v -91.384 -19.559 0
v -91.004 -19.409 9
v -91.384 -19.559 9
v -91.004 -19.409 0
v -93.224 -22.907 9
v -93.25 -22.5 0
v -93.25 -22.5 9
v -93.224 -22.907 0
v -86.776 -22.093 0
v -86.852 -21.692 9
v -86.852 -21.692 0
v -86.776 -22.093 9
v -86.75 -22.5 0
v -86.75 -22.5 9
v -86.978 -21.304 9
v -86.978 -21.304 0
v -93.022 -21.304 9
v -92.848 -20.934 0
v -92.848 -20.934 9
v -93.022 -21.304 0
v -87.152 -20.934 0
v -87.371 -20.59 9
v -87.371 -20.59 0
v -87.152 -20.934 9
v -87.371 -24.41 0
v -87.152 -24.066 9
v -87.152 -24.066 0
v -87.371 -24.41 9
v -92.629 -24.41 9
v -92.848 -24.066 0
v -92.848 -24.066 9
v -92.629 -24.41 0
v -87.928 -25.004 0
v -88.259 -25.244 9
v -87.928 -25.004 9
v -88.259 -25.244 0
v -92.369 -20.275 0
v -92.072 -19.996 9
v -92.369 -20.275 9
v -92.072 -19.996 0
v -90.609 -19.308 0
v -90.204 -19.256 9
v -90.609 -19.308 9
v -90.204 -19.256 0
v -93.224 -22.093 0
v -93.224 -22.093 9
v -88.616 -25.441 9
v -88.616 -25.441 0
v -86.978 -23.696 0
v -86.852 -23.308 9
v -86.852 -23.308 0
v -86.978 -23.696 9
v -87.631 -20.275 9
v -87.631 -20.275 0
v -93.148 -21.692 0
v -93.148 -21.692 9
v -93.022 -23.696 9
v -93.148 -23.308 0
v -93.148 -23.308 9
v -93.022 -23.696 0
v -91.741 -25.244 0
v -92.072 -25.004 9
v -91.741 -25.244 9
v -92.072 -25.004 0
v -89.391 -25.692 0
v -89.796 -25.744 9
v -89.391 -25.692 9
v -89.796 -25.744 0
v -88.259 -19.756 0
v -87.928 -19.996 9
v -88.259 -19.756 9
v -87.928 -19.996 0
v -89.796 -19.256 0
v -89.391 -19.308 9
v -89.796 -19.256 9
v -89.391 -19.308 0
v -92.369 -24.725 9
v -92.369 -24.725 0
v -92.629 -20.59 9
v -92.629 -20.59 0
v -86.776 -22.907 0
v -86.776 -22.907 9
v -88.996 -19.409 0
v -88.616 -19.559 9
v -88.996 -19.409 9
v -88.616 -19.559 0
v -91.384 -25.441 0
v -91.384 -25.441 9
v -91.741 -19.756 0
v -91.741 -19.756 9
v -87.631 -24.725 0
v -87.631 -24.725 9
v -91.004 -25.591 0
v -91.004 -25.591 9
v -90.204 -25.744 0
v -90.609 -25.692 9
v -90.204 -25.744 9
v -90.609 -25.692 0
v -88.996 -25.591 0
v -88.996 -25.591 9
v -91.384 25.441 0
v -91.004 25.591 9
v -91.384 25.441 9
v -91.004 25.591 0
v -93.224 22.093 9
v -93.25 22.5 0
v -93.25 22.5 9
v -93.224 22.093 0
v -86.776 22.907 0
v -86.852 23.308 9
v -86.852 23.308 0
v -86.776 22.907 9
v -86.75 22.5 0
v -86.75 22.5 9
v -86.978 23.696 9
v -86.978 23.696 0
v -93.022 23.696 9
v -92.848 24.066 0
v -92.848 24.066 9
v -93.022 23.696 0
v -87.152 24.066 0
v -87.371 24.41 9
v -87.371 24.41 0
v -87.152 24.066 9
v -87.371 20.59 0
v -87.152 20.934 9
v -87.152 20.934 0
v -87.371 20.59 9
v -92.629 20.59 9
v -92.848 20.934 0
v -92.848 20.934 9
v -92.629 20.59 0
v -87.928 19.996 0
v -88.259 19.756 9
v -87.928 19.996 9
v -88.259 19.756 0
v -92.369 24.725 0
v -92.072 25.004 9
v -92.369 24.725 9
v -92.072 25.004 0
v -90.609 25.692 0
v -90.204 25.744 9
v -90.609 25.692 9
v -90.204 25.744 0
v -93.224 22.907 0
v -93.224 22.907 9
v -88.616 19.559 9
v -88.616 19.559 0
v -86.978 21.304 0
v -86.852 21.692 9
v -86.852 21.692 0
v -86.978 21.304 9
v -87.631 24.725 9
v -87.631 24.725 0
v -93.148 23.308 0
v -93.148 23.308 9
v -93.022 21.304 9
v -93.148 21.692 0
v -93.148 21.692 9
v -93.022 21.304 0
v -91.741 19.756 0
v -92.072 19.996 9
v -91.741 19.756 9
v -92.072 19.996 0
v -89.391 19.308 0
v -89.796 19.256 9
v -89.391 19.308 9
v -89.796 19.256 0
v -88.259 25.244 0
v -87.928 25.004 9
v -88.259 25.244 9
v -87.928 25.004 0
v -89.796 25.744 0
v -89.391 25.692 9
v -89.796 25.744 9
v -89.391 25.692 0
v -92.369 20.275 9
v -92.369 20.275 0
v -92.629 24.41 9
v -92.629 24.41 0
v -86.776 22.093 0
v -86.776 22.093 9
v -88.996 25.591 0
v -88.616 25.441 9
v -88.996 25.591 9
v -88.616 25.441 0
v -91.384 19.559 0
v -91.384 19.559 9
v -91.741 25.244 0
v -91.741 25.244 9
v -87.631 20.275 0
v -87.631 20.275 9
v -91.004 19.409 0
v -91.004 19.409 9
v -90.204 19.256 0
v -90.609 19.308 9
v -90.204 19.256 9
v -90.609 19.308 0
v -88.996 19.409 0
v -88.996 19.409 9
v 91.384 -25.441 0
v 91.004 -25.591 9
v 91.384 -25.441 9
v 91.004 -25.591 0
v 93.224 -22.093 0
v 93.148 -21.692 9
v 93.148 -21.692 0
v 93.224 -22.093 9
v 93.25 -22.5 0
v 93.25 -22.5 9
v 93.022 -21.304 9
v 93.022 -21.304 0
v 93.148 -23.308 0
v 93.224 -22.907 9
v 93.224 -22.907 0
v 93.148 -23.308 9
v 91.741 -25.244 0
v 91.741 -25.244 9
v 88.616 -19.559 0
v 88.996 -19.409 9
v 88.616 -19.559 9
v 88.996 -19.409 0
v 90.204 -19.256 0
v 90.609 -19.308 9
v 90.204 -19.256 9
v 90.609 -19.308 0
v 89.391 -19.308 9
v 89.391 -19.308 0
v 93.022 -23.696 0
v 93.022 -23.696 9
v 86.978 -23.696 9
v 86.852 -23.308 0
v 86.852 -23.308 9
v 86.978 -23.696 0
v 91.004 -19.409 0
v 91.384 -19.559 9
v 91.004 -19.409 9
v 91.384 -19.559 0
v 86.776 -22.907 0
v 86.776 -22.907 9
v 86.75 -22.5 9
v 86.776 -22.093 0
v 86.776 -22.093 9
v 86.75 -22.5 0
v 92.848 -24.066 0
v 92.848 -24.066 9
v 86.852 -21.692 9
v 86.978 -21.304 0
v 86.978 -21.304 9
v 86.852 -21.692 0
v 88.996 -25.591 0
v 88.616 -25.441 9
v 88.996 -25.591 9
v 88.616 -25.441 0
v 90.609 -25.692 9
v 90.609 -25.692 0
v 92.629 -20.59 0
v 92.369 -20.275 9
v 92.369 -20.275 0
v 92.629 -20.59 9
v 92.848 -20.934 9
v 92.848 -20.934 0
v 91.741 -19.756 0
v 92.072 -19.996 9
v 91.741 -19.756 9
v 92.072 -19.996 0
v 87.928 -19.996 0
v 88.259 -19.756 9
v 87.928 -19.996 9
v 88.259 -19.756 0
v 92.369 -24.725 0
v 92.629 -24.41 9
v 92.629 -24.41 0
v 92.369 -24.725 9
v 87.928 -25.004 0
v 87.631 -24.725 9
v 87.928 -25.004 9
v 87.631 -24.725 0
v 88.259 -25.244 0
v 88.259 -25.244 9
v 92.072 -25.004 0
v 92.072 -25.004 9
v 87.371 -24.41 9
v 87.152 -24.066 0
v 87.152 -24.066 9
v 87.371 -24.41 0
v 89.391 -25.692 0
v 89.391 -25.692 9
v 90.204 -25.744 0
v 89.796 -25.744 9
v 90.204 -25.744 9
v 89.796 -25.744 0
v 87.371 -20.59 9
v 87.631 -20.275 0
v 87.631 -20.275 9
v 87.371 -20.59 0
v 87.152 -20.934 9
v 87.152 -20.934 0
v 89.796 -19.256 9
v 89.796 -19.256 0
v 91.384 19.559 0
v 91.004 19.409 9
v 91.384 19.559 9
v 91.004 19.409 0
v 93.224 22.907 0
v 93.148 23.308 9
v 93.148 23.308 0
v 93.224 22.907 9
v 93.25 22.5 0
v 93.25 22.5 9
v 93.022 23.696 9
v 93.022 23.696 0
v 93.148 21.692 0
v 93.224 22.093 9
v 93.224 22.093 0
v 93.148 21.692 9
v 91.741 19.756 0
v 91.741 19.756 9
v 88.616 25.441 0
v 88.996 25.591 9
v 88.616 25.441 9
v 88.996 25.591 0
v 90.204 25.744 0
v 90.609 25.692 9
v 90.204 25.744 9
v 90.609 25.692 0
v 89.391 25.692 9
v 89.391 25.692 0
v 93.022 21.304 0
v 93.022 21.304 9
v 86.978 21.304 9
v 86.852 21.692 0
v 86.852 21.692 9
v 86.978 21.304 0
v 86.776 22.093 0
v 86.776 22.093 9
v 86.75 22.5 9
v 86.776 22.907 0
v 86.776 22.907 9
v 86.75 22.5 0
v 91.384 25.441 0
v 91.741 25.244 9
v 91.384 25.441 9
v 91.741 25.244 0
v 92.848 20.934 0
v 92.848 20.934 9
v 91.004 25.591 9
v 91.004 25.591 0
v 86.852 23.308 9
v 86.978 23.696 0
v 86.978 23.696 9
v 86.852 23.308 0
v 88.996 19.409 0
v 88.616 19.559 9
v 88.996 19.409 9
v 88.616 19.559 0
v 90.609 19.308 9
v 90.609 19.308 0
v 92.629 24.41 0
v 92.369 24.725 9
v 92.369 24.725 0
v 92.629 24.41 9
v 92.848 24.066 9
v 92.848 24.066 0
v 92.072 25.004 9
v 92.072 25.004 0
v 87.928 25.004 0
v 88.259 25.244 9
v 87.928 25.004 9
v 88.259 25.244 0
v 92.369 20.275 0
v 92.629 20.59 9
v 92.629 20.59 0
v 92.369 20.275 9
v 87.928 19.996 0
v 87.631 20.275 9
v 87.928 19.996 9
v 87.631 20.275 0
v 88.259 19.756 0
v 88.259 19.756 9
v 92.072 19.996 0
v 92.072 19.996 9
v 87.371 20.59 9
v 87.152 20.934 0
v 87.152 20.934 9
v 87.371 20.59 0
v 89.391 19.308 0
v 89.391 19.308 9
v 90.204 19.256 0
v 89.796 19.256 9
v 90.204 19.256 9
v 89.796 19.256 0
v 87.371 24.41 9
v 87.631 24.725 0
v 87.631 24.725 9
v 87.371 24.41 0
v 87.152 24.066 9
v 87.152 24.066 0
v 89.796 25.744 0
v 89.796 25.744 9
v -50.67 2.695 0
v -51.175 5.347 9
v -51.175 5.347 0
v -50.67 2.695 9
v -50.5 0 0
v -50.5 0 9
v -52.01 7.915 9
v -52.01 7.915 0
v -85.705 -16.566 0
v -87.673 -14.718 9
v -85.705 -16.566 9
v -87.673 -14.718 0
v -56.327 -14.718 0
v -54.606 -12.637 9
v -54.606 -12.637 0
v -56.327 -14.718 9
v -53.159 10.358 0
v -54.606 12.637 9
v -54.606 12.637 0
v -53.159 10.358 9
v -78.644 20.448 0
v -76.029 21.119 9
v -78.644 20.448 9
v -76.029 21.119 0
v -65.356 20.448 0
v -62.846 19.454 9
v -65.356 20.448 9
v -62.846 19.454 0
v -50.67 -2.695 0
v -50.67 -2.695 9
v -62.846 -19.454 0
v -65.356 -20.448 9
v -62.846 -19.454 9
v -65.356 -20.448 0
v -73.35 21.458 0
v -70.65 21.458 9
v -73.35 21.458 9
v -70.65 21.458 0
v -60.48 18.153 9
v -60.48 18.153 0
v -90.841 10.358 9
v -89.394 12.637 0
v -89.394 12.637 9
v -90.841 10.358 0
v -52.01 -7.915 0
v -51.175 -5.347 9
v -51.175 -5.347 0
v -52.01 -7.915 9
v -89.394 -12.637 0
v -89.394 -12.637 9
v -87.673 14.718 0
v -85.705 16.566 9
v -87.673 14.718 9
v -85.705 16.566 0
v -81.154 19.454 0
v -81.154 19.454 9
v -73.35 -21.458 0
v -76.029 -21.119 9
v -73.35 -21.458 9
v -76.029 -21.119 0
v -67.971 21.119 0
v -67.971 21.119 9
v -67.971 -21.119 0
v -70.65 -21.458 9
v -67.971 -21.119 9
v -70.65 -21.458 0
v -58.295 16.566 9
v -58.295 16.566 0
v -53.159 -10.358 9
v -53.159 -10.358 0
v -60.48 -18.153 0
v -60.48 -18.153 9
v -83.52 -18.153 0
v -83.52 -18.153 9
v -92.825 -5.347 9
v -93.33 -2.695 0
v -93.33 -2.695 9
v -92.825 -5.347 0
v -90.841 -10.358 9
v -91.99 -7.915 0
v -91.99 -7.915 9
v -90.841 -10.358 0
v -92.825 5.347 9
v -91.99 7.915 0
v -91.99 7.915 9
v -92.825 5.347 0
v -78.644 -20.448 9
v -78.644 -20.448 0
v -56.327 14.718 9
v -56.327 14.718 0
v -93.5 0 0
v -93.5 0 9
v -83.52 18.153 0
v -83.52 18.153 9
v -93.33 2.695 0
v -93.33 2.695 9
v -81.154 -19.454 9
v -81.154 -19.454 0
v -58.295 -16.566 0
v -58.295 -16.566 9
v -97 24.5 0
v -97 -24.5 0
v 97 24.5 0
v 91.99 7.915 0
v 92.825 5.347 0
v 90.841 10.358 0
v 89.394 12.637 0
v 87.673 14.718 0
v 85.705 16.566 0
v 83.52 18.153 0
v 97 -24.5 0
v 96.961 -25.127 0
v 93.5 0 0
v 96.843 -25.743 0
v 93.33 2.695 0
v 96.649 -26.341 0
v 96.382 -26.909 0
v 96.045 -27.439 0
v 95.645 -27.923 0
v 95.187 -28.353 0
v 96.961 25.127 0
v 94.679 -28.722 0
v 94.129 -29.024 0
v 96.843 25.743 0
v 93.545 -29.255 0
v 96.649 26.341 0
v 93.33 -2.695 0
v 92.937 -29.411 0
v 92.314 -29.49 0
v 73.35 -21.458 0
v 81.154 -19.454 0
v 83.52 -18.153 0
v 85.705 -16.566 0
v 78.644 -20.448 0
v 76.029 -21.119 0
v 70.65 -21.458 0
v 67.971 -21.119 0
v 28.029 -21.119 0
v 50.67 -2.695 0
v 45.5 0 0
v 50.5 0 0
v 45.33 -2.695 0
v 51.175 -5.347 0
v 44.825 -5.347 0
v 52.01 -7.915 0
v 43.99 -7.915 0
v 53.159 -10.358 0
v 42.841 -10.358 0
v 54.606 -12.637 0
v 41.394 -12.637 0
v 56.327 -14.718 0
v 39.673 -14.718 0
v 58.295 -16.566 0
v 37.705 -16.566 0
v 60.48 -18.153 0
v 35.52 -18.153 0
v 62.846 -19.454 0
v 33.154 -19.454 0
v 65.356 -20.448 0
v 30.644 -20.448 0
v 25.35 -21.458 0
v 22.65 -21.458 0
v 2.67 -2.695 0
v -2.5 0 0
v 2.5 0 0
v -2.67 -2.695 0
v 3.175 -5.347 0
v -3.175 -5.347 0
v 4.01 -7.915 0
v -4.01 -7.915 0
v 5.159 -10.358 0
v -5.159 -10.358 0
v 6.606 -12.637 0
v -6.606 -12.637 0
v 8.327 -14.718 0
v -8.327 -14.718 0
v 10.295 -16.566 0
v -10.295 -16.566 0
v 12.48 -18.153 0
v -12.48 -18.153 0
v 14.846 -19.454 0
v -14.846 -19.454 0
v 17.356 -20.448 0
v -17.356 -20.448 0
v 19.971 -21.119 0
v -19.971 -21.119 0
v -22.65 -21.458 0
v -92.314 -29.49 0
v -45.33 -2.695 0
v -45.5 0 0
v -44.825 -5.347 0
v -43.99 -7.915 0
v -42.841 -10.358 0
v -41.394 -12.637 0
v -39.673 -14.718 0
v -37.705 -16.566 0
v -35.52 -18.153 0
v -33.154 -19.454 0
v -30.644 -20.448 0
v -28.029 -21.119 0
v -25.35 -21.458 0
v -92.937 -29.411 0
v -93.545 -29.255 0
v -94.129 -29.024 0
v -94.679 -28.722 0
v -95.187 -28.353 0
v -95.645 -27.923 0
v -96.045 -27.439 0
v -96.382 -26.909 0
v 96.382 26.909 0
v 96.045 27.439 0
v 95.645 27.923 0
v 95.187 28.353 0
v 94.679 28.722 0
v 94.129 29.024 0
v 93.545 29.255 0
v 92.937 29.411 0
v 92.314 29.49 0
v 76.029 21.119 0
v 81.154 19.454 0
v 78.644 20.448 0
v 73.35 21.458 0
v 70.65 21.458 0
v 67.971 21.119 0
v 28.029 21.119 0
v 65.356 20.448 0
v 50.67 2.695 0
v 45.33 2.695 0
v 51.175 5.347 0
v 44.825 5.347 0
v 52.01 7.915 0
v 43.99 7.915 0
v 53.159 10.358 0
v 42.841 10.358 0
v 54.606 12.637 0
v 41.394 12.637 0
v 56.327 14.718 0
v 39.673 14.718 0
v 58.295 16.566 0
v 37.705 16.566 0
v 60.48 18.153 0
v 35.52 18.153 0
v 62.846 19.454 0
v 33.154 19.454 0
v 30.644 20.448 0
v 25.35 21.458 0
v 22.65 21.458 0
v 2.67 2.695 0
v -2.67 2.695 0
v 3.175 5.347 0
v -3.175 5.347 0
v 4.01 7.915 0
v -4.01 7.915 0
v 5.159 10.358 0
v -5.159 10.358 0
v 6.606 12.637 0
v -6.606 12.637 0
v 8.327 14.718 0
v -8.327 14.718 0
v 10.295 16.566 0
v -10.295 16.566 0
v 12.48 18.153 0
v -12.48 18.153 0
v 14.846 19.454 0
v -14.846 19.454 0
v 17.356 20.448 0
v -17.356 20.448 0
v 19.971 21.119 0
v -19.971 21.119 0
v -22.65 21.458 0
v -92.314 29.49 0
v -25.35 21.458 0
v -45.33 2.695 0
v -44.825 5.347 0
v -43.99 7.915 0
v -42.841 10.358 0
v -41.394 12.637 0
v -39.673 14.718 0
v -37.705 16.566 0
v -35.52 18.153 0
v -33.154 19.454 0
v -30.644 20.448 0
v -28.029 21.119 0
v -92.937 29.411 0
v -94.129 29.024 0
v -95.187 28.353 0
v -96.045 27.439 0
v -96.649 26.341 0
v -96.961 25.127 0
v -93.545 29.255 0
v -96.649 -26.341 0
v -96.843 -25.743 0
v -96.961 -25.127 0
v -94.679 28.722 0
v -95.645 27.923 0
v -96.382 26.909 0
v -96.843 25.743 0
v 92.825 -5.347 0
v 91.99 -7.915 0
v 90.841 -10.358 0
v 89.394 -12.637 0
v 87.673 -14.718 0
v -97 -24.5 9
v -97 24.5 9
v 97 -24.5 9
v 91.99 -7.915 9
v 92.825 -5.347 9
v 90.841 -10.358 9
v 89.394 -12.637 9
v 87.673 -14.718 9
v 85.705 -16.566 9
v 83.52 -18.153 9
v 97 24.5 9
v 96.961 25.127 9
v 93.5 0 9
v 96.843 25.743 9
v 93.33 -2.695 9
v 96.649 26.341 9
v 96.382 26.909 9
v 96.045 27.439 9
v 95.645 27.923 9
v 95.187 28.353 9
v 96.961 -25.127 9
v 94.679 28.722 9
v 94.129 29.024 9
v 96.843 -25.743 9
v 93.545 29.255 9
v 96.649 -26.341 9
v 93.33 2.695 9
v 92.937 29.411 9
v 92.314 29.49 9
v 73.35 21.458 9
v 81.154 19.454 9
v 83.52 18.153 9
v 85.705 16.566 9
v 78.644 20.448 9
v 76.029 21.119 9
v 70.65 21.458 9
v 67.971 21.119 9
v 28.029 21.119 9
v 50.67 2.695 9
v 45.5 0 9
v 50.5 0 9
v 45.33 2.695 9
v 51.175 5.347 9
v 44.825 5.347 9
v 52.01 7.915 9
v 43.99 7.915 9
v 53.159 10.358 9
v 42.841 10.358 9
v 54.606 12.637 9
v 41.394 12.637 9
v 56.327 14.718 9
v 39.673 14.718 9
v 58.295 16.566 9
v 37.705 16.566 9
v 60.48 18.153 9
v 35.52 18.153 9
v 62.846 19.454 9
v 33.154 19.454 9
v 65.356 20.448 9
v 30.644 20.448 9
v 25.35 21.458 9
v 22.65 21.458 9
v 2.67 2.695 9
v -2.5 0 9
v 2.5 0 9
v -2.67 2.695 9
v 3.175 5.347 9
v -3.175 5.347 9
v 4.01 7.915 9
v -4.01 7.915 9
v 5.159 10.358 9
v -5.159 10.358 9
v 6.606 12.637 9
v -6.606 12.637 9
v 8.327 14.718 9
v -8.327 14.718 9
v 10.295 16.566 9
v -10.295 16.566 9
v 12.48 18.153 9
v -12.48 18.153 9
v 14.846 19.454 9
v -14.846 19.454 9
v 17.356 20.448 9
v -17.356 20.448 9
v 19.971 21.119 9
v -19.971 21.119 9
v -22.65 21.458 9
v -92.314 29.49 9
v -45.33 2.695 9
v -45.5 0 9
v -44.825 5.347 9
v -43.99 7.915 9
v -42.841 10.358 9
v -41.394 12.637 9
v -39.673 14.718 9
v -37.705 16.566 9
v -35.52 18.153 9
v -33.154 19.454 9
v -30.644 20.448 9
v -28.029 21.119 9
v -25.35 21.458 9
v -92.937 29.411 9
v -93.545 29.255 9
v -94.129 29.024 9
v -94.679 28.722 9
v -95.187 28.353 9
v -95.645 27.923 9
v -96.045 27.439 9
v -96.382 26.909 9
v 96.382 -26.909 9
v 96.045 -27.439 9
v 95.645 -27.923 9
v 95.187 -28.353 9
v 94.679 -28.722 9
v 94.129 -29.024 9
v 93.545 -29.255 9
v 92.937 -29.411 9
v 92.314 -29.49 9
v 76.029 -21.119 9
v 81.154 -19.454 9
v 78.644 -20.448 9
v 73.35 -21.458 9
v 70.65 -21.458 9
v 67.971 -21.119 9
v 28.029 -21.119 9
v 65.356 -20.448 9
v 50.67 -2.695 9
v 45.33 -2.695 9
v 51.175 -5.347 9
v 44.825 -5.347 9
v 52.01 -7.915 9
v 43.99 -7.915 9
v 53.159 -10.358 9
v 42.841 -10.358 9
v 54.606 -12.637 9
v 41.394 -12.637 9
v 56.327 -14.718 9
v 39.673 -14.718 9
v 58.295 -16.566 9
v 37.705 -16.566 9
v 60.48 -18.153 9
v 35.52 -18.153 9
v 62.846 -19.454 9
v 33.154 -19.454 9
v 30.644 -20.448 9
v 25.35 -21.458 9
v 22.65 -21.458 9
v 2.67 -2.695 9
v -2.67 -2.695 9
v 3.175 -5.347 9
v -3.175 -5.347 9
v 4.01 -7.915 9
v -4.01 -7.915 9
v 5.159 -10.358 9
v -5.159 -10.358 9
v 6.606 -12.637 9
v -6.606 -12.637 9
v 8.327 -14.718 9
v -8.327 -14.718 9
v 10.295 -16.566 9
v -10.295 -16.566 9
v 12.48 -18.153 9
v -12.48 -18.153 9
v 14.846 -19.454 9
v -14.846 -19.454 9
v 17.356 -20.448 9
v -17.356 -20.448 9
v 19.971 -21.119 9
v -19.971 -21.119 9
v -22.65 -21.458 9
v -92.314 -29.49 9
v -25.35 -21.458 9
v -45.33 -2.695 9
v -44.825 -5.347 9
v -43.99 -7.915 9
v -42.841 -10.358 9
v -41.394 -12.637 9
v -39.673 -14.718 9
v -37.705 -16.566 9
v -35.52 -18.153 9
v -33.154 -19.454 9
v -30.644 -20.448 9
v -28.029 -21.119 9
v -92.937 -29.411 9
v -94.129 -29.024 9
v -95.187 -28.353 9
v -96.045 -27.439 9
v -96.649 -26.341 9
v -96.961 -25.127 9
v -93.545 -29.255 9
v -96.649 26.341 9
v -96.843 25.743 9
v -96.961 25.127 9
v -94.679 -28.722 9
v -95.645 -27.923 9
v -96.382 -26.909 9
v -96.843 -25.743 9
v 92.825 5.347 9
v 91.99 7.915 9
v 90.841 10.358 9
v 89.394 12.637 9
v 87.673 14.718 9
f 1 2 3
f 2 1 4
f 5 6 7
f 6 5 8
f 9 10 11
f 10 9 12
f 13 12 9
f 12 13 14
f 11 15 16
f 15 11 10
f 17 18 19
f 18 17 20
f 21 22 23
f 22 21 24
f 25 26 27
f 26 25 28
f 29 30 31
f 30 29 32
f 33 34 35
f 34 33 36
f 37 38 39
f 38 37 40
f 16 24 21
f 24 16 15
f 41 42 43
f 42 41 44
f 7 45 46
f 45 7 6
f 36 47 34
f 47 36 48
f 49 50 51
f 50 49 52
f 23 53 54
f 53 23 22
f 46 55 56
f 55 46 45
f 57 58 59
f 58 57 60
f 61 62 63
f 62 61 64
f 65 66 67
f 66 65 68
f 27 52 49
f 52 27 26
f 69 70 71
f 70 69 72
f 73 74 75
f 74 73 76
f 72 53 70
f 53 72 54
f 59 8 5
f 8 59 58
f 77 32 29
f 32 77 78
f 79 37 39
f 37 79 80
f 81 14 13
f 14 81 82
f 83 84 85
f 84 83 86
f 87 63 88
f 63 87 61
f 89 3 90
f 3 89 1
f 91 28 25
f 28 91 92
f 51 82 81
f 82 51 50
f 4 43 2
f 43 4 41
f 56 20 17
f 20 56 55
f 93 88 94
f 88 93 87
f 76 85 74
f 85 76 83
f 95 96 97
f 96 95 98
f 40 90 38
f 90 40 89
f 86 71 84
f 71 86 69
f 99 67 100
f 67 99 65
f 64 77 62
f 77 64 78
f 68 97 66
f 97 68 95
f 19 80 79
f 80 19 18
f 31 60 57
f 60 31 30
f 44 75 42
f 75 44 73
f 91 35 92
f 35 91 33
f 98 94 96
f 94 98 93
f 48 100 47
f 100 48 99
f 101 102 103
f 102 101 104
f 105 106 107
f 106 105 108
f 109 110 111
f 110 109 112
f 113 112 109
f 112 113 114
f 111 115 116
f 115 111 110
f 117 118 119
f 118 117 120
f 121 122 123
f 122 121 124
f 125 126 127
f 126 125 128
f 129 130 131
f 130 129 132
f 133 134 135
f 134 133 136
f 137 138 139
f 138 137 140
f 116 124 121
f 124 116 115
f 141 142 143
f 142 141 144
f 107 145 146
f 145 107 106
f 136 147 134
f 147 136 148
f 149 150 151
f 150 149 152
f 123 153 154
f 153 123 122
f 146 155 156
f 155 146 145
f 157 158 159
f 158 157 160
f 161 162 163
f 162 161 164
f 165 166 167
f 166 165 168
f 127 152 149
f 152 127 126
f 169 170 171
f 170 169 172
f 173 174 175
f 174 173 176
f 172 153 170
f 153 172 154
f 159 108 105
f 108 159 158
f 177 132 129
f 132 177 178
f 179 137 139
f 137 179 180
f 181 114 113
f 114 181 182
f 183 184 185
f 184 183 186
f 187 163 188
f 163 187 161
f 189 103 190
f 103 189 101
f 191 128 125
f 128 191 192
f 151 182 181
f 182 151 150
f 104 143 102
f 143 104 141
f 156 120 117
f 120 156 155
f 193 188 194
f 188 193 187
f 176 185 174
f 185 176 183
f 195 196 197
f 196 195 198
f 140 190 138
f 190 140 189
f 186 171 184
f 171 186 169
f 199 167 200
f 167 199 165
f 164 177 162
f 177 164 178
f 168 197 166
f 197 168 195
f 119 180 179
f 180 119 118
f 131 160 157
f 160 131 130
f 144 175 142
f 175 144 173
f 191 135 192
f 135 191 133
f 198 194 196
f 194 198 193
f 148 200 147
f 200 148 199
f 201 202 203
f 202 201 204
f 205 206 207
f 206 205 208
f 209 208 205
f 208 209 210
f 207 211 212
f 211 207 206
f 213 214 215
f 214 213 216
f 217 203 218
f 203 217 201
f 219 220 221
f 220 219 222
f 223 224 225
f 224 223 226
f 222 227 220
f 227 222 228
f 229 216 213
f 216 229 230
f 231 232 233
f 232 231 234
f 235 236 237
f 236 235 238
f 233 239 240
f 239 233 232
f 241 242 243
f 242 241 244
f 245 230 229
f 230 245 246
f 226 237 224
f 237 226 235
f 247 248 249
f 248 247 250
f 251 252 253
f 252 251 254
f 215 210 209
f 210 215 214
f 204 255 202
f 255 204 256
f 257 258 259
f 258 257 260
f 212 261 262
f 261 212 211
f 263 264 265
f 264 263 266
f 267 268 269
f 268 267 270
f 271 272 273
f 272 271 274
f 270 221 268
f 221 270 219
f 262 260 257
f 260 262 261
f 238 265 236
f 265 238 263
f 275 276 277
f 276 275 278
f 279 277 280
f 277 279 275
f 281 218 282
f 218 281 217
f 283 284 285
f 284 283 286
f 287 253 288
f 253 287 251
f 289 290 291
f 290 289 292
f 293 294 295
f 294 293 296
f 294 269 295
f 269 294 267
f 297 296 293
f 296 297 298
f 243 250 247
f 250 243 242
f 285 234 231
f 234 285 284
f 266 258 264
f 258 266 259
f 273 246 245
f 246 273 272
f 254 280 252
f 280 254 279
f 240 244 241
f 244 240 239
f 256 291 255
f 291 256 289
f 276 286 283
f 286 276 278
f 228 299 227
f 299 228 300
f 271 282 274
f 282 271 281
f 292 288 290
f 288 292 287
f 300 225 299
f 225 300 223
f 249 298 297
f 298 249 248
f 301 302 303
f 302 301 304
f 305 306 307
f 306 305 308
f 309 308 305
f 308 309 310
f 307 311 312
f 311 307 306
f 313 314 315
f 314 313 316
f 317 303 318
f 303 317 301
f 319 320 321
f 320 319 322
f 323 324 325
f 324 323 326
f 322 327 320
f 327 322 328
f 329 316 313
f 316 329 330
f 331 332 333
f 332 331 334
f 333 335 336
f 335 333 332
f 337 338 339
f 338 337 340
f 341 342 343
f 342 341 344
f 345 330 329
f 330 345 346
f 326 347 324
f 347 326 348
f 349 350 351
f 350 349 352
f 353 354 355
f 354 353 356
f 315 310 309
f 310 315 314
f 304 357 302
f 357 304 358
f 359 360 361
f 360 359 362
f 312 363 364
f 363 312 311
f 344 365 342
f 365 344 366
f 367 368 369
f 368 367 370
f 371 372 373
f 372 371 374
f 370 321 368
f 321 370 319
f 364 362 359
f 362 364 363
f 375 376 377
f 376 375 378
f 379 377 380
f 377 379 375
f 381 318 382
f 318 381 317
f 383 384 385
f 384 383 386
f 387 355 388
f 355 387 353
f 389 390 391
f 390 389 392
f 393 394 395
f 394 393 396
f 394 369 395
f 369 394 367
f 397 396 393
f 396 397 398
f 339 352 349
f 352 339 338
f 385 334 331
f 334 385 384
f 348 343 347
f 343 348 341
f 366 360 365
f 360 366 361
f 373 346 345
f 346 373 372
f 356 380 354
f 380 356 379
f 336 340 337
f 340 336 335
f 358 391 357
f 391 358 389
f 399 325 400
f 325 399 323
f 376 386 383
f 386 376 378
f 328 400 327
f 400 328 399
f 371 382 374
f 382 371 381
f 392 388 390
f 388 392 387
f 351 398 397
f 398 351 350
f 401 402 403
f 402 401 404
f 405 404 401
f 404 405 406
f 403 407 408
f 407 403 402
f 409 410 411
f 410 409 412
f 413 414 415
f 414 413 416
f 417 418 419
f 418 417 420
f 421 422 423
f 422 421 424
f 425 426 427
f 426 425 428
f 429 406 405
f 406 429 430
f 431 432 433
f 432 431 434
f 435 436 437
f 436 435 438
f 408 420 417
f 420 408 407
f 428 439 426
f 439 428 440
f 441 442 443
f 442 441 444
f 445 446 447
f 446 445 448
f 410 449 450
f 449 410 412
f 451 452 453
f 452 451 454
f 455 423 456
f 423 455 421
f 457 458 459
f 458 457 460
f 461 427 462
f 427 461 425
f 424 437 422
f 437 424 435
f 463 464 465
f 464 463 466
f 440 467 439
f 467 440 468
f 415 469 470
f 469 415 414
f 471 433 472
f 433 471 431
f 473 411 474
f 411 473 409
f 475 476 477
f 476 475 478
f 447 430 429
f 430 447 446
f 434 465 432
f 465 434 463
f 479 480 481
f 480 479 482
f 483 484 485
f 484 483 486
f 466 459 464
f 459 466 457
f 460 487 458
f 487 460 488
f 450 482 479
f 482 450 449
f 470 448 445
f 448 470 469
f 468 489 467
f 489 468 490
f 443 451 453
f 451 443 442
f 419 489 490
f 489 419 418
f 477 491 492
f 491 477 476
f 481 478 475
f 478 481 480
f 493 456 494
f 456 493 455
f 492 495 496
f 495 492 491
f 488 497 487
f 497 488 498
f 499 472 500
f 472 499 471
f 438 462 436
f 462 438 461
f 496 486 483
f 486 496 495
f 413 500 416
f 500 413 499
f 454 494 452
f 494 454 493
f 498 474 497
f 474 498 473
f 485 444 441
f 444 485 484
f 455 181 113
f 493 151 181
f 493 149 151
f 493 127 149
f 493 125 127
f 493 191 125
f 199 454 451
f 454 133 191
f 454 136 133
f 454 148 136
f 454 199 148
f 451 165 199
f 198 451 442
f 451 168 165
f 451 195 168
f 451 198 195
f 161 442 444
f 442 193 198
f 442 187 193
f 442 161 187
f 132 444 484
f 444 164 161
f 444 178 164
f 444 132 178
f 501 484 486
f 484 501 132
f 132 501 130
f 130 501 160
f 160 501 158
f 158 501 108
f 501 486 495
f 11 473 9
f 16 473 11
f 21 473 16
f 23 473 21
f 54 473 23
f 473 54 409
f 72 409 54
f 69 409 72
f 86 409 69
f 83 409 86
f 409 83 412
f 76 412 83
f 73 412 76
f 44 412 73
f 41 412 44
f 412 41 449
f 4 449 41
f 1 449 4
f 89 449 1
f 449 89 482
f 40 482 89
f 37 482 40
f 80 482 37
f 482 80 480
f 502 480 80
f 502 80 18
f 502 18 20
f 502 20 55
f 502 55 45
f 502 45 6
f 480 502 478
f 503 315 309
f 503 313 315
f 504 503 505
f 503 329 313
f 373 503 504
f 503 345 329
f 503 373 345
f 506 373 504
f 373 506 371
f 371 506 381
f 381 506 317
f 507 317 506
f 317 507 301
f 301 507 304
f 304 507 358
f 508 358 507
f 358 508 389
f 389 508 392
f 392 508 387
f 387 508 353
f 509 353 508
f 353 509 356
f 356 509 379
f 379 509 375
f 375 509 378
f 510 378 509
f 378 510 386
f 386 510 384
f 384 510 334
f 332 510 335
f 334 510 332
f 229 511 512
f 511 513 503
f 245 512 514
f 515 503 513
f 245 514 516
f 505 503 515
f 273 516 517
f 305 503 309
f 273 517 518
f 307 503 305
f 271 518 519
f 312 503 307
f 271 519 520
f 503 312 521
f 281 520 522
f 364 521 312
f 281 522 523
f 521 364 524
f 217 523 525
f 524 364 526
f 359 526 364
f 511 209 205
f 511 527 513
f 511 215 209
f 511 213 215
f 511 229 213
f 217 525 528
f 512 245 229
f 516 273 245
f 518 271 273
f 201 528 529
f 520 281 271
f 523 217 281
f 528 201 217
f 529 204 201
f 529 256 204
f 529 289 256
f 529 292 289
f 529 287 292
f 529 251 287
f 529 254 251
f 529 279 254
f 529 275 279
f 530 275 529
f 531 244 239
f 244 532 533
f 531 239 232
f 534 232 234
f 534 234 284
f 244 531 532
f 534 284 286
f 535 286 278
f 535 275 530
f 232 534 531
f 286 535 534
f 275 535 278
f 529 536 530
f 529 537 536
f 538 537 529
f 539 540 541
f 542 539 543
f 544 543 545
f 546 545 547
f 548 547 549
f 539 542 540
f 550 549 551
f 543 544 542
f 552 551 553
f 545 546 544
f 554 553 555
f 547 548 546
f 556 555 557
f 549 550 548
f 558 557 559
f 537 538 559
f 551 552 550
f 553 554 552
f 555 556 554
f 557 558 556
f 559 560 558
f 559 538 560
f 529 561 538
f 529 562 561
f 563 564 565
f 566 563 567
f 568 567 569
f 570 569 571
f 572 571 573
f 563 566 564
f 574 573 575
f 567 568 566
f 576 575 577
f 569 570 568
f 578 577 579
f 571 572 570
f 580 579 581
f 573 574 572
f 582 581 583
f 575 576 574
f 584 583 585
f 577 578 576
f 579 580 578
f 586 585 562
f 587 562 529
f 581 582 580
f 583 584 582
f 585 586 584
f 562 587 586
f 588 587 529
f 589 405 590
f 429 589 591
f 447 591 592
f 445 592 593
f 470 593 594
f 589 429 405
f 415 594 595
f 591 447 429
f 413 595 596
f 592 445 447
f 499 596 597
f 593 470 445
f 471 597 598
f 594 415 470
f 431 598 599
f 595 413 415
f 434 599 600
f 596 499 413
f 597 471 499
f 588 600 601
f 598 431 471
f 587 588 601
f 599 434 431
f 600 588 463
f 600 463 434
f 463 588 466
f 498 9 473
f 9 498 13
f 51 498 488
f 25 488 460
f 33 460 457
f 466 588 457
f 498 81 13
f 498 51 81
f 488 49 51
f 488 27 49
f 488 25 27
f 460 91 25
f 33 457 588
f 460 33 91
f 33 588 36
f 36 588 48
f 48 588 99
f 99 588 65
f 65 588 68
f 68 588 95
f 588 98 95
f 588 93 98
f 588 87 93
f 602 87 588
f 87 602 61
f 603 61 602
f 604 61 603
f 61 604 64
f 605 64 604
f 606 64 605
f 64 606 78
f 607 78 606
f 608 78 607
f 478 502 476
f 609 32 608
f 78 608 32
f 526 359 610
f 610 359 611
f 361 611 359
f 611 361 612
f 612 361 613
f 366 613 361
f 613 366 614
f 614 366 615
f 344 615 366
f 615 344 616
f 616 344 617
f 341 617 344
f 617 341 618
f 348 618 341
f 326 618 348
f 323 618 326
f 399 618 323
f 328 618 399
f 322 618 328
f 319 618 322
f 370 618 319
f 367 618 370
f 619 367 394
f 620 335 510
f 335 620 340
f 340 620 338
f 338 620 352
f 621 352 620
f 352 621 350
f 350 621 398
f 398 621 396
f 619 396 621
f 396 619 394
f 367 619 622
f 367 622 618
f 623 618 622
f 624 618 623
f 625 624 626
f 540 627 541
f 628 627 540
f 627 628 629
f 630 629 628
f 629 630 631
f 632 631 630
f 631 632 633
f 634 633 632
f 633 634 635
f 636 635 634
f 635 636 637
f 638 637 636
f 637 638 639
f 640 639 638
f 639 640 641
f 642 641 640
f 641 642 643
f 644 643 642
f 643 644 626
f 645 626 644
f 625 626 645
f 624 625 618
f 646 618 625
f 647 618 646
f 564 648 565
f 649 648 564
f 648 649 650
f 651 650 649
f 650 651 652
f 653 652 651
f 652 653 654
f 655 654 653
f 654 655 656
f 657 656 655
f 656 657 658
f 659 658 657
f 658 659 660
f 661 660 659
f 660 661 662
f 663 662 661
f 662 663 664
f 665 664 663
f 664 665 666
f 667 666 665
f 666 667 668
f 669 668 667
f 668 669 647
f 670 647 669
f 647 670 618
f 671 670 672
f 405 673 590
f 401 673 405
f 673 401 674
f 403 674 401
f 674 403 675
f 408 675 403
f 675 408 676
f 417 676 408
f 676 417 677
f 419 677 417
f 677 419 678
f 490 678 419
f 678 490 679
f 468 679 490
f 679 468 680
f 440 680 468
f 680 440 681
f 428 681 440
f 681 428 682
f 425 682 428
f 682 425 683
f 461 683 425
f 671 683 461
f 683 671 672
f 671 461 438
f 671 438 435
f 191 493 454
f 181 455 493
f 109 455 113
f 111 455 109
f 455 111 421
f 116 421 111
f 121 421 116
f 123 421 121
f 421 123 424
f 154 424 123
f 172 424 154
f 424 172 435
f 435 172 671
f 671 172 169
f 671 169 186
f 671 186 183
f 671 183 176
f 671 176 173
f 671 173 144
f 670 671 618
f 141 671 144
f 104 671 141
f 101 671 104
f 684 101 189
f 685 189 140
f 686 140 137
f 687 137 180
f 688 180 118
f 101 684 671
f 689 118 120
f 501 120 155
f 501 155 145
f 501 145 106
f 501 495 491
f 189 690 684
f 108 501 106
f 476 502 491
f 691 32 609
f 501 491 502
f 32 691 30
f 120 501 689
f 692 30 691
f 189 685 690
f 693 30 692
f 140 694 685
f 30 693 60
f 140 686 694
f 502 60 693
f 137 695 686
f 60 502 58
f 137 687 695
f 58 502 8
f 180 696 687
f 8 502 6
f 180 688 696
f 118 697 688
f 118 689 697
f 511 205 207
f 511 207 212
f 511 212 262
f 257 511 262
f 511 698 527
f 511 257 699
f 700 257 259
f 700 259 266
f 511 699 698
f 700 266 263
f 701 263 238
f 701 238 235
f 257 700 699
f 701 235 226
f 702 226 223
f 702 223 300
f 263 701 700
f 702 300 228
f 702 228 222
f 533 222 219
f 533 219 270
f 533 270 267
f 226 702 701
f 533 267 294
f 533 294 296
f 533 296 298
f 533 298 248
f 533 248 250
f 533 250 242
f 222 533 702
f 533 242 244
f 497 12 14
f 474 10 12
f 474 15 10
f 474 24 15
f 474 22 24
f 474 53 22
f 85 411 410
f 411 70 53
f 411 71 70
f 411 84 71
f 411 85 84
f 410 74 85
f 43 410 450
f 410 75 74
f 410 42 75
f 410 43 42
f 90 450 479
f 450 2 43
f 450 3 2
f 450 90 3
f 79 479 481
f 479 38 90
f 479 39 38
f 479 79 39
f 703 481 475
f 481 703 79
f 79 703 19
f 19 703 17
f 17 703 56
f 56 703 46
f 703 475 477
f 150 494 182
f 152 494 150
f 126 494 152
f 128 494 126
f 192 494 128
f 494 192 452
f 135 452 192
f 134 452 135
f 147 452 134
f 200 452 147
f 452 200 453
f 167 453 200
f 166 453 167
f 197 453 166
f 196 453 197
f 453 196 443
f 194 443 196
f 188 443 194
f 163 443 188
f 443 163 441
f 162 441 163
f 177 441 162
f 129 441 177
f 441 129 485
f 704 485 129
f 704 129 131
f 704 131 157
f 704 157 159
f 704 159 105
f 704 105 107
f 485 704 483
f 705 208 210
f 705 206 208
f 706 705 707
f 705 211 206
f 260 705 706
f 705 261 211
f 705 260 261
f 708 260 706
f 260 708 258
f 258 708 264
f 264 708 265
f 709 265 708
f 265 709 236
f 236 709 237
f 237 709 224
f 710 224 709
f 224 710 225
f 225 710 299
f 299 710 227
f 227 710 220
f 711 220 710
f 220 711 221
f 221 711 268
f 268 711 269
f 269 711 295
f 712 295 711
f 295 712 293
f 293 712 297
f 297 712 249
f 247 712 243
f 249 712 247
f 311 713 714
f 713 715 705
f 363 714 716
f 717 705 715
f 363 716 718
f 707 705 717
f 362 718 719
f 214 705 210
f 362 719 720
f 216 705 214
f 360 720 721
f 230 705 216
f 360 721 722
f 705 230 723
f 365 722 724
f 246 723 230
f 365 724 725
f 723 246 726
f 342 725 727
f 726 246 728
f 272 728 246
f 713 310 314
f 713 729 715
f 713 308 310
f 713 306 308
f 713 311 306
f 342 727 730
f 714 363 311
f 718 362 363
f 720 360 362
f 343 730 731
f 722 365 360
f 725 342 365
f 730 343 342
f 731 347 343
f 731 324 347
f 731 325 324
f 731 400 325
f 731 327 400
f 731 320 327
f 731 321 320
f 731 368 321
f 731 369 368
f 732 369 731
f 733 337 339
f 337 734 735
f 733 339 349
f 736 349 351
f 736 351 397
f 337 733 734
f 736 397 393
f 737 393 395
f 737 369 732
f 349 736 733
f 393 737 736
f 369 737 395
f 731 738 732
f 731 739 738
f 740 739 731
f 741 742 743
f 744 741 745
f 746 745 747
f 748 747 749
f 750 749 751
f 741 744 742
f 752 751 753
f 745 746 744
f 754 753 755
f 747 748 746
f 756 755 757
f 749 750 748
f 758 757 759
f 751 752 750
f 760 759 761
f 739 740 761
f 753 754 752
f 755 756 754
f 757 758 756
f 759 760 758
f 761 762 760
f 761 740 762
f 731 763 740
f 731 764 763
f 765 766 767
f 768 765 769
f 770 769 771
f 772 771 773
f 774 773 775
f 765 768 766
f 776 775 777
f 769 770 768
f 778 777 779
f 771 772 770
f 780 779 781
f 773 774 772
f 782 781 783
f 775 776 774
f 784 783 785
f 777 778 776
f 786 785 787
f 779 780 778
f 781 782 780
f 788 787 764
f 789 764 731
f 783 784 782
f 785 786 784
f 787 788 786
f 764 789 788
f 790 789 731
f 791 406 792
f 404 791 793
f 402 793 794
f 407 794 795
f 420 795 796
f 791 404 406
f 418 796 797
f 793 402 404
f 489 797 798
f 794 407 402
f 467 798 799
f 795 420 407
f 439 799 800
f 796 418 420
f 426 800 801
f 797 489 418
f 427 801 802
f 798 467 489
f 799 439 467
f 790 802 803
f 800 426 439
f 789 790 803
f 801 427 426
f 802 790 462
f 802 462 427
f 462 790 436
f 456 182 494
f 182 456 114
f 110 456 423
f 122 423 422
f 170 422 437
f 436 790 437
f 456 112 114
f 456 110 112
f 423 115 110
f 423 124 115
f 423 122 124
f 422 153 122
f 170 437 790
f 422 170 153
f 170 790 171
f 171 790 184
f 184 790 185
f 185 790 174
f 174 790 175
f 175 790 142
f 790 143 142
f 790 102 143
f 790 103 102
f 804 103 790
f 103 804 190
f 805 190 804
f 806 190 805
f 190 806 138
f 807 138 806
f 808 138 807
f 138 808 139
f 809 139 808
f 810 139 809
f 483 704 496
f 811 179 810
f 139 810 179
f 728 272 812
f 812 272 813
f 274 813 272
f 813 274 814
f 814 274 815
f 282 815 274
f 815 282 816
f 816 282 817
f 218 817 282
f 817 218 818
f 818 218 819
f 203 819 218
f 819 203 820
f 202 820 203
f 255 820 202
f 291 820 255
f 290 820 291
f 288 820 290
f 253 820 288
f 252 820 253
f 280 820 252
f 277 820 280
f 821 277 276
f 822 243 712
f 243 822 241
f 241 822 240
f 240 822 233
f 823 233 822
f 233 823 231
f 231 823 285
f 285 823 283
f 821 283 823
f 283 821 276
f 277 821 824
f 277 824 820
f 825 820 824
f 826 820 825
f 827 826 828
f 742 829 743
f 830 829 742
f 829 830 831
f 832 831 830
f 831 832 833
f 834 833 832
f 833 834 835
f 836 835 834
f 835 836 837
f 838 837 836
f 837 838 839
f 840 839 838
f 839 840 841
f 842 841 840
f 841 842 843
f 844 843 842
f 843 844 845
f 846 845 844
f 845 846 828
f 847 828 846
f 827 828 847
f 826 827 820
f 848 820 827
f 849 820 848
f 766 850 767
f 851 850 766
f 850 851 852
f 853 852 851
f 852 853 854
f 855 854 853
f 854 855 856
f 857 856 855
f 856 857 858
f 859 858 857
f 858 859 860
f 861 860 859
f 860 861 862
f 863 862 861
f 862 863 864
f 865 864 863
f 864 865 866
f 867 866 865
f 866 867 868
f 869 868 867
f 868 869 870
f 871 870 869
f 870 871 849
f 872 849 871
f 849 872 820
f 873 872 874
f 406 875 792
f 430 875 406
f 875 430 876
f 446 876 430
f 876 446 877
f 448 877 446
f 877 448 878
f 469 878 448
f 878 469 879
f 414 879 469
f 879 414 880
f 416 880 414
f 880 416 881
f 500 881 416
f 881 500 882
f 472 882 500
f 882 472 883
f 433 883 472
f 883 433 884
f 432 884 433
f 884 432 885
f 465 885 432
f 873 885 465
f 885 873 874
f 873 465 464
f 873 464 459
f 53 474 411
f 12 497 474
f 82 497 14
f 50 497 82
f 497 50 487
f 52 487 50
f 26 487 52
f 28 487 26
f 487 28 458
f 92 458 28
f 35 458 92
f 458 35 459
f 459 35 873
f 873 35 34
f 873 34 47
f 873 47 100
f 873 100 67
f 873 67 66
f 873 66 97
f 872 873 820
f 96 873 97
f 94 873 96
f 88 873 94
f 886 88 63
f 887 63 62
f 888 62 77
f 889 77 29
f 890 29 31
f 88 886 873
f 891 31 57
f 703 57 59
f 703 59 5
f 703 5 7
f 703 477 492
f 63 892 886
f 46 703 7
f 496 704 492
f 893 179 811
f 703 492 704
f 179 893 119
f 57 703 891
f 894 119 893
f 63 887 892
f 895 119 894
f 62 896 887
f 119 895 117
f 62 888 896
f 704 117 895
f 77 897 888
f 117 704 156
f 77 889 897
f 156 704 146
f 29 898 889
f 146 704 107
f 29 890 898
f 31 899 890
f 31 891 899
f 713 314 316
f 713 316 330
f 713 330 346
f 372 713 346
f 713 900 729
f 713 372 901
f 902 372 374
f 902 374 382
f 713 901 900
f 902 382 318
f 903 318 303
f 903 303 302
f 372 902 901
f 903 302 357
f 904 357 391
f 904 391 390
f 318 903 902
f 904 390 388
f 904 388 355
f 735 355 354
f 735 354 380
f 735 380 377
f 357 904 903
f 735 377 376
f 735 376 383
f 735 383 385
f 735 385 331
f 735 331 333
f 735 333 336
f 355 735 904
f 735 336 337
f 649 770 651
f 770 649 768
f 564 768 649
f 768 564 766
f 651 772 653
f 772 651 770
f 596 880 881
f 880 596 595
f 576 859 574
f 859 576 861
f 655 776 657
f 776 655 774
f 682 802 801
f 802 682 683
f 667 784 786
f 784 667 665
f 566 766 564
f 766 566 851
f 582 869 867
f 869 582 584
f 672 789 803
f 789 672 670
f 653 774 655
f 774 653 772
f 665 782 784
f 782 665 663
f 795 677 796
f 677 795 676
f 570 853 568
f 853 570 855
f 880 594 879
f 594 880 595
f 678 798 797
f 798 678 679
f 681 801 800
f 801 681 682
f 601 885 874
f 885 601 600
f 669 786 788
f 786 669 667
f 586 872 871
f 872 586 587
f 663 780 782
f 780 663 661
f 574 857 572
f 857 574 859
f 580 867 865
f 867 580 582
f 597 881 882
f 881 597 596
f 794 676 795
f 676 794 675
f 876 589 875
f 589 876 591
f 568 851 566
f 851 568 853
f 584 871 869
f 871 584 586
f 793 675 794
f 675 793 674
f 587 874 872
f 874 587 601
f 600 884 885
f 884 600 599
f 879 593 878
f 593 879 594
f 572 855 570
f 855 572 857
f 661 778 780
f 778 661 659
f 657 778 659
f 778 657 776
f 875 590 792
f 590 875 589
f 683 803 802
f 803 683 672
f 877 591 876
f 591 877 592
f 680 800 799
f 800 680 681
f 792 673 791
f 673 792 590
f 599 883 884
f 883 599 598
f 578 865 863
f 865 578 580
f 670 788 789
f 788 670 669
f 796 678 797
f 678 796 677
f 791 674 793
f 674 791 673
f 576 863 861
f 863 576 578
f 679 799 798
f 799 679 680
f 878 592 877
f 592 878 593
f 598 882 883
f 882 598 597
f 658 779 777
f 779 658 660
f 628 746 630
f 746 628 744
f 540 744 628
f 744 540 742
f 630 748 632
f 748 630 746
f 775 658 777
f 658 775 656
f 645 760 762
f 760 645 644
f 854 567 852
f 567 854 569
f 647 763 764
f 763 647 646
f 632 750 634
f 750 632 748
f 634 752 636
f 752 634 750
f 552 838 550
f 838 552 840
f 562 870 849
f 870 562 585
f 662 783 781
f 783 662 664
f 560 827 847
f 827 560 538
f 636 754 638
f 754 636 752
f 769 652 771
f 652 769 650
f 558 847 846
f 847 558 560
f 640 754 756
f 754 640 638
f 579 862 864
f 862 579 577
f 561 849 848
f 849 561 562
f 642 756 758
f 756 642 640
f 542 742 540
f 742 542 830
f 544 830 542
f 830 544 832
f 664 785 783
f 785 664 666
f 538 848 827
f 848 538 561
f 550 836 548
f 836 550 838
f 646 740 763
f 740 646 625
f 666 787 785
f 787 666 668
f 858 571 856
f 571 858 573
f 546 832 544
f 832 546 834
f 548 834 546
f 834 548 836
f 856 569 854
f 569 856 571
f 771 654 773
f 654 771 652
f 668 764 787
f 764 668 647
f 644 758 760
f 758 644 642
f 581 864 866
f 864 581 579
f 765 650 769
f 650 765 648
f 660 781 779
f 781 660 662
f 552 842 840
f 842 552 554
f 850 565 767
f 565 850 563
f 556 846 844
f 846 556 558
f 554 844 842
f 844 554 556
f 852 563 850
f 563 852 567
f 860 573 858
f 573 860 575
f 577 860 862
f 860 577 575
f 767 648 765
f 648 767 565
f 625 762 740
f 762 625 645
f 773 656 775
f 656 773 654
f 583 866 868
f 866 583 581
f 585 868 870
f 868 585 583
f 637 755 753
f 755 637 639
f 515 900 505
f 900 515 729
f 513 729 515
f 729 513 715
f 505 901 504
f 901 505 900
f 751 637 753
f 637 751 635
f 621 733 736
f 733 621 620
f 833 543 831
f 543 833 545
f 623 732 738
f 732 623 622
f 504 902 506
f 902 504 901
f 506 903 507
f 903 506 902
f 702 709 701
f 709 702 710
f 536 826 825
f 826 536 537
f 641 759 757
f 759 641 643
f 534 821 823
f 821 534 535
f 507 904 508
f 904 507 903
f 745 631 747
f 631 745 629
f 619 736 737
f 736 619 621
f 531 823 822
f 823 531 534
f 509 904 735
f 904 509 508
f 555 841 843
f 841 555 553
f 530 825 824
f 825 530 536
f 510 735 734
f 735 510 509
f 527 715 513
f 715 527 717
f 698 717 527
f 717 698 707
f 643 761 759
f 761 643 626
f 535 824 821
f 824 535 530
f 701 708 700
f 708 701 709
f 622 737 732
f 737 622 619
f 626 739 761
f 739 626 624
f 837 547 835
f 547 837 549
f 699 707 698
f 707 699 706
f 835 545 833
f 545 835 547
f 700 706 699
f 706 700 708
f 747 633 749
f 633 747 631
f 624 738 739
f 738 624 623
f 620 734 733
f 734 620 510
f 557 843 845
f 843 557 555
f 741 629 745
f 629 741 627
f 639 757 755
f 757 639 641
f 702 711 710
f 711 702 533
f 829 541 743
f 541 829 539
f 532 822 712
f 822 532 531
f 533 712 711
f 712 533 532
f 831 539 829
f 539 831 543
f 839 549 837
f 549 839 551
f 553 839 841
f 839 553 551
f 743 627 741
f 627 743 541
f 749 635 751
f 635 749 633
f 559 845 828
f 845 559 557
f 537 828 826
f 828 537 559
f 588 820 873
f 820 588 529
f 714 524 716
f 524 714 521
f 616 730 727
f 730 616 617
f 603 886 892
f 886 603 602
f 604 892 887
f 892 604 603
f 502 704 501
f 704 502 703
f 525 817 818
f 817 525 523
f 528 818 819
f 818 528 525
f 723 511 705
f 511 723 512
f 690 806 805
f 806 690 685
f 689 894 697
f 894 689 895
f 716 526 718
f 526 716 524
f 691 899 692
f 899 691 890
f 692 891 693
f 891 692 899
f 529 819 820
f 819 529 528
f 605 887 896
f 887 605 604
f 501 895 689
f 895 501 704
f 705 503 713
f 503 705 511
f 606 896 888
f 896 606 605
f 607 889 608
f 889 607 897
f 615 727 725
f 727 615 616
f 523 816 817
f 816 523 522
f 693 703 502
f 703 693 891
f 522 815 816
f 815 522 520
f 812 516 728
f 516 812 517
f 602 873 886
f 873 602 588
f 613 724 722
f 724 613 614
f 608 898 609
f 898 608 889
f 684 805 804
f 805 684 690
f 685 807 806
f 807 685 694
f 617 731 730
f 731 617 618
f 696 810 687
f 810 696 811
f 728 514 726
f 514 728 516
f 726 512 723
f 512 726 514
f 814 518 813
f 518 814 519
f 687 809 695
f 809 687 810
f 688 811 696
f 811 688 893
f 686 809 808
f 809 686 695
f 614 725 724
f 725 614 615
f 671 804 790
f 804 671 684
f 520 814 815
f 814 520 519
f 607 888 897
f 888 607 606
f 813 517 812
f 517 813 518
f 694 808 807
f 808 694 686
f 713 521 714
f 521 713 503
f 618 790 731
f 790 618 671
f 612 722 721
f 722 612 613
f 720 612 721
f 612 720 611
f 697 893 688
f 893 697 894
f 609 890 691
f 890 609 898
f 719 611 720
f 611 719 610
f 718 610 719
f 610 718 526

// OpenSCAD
$fn = 50;

difference() {
	union() {
		hull() {
			translate(v = [-92.0, 24.5, 0]) {
				cylinder(h = 9, r = 5);
			}
			translate(v = [92.0, 24.5, 0]) {
				cylinder(h = 9, r = 5);
			}
			translate(v = [-92.0, -24.5, 0]) {
				cylinder(h = 9, r = 5);
			}
			translate(v = [92.0, -24.5, 0]) {
				cylinder(h = 9, r = 5);
			}
		}
	}
	union() {
		translate(v = [-90.0, -22.5, -100.0]) {
			cylinder(h = 200, r = 3.25);
		}
		translate(v = [-90.0, 22.5, -100.0]) {
			cylinder(h = 200, r = 3.25);
		}
		translate(v = [90.0, -22.5, -100.0]) {
			cylinder(h = 200, r = 3.25);
		}
		translate(v = [90.0, 22.5, -100.0]) {
			cylinder(h = 200, r = 3.25);
		}
		translate(v = [-90.0, -22.5, -100.0]) {
			cylinder(h = 200, r = 1.8);
		}
		translate(v = [-90.0, 22.5, -100.0]) {
			cylinder(h = 200, r = 1.8);
		}
		translate(v = [90.0, -22.5, -100.0]) {
			cylinder(h = 200, r = 1.8);
		}
		translate(v = [90.0, 22.5, -100.0]) {
			cylinder(h = 200, r = 1.8);
		}
		translate(v = [-72.0, 0, 0.0]) {
			cylinder(h = 9, r = 21.5);
		}
		translate(v = [-24.0, 0, 0.0]) {
			cylinder(h = 9, r = 21.5);
		}
		translate(v = [24.0, 0, 0.0]) {
			cylinder(h = 9, r = 21.5);
		}
		translate(v = [72.0, 0, 0.0]) {
			cylinder(h = 9, r = 21.5);
		}
	}
}
